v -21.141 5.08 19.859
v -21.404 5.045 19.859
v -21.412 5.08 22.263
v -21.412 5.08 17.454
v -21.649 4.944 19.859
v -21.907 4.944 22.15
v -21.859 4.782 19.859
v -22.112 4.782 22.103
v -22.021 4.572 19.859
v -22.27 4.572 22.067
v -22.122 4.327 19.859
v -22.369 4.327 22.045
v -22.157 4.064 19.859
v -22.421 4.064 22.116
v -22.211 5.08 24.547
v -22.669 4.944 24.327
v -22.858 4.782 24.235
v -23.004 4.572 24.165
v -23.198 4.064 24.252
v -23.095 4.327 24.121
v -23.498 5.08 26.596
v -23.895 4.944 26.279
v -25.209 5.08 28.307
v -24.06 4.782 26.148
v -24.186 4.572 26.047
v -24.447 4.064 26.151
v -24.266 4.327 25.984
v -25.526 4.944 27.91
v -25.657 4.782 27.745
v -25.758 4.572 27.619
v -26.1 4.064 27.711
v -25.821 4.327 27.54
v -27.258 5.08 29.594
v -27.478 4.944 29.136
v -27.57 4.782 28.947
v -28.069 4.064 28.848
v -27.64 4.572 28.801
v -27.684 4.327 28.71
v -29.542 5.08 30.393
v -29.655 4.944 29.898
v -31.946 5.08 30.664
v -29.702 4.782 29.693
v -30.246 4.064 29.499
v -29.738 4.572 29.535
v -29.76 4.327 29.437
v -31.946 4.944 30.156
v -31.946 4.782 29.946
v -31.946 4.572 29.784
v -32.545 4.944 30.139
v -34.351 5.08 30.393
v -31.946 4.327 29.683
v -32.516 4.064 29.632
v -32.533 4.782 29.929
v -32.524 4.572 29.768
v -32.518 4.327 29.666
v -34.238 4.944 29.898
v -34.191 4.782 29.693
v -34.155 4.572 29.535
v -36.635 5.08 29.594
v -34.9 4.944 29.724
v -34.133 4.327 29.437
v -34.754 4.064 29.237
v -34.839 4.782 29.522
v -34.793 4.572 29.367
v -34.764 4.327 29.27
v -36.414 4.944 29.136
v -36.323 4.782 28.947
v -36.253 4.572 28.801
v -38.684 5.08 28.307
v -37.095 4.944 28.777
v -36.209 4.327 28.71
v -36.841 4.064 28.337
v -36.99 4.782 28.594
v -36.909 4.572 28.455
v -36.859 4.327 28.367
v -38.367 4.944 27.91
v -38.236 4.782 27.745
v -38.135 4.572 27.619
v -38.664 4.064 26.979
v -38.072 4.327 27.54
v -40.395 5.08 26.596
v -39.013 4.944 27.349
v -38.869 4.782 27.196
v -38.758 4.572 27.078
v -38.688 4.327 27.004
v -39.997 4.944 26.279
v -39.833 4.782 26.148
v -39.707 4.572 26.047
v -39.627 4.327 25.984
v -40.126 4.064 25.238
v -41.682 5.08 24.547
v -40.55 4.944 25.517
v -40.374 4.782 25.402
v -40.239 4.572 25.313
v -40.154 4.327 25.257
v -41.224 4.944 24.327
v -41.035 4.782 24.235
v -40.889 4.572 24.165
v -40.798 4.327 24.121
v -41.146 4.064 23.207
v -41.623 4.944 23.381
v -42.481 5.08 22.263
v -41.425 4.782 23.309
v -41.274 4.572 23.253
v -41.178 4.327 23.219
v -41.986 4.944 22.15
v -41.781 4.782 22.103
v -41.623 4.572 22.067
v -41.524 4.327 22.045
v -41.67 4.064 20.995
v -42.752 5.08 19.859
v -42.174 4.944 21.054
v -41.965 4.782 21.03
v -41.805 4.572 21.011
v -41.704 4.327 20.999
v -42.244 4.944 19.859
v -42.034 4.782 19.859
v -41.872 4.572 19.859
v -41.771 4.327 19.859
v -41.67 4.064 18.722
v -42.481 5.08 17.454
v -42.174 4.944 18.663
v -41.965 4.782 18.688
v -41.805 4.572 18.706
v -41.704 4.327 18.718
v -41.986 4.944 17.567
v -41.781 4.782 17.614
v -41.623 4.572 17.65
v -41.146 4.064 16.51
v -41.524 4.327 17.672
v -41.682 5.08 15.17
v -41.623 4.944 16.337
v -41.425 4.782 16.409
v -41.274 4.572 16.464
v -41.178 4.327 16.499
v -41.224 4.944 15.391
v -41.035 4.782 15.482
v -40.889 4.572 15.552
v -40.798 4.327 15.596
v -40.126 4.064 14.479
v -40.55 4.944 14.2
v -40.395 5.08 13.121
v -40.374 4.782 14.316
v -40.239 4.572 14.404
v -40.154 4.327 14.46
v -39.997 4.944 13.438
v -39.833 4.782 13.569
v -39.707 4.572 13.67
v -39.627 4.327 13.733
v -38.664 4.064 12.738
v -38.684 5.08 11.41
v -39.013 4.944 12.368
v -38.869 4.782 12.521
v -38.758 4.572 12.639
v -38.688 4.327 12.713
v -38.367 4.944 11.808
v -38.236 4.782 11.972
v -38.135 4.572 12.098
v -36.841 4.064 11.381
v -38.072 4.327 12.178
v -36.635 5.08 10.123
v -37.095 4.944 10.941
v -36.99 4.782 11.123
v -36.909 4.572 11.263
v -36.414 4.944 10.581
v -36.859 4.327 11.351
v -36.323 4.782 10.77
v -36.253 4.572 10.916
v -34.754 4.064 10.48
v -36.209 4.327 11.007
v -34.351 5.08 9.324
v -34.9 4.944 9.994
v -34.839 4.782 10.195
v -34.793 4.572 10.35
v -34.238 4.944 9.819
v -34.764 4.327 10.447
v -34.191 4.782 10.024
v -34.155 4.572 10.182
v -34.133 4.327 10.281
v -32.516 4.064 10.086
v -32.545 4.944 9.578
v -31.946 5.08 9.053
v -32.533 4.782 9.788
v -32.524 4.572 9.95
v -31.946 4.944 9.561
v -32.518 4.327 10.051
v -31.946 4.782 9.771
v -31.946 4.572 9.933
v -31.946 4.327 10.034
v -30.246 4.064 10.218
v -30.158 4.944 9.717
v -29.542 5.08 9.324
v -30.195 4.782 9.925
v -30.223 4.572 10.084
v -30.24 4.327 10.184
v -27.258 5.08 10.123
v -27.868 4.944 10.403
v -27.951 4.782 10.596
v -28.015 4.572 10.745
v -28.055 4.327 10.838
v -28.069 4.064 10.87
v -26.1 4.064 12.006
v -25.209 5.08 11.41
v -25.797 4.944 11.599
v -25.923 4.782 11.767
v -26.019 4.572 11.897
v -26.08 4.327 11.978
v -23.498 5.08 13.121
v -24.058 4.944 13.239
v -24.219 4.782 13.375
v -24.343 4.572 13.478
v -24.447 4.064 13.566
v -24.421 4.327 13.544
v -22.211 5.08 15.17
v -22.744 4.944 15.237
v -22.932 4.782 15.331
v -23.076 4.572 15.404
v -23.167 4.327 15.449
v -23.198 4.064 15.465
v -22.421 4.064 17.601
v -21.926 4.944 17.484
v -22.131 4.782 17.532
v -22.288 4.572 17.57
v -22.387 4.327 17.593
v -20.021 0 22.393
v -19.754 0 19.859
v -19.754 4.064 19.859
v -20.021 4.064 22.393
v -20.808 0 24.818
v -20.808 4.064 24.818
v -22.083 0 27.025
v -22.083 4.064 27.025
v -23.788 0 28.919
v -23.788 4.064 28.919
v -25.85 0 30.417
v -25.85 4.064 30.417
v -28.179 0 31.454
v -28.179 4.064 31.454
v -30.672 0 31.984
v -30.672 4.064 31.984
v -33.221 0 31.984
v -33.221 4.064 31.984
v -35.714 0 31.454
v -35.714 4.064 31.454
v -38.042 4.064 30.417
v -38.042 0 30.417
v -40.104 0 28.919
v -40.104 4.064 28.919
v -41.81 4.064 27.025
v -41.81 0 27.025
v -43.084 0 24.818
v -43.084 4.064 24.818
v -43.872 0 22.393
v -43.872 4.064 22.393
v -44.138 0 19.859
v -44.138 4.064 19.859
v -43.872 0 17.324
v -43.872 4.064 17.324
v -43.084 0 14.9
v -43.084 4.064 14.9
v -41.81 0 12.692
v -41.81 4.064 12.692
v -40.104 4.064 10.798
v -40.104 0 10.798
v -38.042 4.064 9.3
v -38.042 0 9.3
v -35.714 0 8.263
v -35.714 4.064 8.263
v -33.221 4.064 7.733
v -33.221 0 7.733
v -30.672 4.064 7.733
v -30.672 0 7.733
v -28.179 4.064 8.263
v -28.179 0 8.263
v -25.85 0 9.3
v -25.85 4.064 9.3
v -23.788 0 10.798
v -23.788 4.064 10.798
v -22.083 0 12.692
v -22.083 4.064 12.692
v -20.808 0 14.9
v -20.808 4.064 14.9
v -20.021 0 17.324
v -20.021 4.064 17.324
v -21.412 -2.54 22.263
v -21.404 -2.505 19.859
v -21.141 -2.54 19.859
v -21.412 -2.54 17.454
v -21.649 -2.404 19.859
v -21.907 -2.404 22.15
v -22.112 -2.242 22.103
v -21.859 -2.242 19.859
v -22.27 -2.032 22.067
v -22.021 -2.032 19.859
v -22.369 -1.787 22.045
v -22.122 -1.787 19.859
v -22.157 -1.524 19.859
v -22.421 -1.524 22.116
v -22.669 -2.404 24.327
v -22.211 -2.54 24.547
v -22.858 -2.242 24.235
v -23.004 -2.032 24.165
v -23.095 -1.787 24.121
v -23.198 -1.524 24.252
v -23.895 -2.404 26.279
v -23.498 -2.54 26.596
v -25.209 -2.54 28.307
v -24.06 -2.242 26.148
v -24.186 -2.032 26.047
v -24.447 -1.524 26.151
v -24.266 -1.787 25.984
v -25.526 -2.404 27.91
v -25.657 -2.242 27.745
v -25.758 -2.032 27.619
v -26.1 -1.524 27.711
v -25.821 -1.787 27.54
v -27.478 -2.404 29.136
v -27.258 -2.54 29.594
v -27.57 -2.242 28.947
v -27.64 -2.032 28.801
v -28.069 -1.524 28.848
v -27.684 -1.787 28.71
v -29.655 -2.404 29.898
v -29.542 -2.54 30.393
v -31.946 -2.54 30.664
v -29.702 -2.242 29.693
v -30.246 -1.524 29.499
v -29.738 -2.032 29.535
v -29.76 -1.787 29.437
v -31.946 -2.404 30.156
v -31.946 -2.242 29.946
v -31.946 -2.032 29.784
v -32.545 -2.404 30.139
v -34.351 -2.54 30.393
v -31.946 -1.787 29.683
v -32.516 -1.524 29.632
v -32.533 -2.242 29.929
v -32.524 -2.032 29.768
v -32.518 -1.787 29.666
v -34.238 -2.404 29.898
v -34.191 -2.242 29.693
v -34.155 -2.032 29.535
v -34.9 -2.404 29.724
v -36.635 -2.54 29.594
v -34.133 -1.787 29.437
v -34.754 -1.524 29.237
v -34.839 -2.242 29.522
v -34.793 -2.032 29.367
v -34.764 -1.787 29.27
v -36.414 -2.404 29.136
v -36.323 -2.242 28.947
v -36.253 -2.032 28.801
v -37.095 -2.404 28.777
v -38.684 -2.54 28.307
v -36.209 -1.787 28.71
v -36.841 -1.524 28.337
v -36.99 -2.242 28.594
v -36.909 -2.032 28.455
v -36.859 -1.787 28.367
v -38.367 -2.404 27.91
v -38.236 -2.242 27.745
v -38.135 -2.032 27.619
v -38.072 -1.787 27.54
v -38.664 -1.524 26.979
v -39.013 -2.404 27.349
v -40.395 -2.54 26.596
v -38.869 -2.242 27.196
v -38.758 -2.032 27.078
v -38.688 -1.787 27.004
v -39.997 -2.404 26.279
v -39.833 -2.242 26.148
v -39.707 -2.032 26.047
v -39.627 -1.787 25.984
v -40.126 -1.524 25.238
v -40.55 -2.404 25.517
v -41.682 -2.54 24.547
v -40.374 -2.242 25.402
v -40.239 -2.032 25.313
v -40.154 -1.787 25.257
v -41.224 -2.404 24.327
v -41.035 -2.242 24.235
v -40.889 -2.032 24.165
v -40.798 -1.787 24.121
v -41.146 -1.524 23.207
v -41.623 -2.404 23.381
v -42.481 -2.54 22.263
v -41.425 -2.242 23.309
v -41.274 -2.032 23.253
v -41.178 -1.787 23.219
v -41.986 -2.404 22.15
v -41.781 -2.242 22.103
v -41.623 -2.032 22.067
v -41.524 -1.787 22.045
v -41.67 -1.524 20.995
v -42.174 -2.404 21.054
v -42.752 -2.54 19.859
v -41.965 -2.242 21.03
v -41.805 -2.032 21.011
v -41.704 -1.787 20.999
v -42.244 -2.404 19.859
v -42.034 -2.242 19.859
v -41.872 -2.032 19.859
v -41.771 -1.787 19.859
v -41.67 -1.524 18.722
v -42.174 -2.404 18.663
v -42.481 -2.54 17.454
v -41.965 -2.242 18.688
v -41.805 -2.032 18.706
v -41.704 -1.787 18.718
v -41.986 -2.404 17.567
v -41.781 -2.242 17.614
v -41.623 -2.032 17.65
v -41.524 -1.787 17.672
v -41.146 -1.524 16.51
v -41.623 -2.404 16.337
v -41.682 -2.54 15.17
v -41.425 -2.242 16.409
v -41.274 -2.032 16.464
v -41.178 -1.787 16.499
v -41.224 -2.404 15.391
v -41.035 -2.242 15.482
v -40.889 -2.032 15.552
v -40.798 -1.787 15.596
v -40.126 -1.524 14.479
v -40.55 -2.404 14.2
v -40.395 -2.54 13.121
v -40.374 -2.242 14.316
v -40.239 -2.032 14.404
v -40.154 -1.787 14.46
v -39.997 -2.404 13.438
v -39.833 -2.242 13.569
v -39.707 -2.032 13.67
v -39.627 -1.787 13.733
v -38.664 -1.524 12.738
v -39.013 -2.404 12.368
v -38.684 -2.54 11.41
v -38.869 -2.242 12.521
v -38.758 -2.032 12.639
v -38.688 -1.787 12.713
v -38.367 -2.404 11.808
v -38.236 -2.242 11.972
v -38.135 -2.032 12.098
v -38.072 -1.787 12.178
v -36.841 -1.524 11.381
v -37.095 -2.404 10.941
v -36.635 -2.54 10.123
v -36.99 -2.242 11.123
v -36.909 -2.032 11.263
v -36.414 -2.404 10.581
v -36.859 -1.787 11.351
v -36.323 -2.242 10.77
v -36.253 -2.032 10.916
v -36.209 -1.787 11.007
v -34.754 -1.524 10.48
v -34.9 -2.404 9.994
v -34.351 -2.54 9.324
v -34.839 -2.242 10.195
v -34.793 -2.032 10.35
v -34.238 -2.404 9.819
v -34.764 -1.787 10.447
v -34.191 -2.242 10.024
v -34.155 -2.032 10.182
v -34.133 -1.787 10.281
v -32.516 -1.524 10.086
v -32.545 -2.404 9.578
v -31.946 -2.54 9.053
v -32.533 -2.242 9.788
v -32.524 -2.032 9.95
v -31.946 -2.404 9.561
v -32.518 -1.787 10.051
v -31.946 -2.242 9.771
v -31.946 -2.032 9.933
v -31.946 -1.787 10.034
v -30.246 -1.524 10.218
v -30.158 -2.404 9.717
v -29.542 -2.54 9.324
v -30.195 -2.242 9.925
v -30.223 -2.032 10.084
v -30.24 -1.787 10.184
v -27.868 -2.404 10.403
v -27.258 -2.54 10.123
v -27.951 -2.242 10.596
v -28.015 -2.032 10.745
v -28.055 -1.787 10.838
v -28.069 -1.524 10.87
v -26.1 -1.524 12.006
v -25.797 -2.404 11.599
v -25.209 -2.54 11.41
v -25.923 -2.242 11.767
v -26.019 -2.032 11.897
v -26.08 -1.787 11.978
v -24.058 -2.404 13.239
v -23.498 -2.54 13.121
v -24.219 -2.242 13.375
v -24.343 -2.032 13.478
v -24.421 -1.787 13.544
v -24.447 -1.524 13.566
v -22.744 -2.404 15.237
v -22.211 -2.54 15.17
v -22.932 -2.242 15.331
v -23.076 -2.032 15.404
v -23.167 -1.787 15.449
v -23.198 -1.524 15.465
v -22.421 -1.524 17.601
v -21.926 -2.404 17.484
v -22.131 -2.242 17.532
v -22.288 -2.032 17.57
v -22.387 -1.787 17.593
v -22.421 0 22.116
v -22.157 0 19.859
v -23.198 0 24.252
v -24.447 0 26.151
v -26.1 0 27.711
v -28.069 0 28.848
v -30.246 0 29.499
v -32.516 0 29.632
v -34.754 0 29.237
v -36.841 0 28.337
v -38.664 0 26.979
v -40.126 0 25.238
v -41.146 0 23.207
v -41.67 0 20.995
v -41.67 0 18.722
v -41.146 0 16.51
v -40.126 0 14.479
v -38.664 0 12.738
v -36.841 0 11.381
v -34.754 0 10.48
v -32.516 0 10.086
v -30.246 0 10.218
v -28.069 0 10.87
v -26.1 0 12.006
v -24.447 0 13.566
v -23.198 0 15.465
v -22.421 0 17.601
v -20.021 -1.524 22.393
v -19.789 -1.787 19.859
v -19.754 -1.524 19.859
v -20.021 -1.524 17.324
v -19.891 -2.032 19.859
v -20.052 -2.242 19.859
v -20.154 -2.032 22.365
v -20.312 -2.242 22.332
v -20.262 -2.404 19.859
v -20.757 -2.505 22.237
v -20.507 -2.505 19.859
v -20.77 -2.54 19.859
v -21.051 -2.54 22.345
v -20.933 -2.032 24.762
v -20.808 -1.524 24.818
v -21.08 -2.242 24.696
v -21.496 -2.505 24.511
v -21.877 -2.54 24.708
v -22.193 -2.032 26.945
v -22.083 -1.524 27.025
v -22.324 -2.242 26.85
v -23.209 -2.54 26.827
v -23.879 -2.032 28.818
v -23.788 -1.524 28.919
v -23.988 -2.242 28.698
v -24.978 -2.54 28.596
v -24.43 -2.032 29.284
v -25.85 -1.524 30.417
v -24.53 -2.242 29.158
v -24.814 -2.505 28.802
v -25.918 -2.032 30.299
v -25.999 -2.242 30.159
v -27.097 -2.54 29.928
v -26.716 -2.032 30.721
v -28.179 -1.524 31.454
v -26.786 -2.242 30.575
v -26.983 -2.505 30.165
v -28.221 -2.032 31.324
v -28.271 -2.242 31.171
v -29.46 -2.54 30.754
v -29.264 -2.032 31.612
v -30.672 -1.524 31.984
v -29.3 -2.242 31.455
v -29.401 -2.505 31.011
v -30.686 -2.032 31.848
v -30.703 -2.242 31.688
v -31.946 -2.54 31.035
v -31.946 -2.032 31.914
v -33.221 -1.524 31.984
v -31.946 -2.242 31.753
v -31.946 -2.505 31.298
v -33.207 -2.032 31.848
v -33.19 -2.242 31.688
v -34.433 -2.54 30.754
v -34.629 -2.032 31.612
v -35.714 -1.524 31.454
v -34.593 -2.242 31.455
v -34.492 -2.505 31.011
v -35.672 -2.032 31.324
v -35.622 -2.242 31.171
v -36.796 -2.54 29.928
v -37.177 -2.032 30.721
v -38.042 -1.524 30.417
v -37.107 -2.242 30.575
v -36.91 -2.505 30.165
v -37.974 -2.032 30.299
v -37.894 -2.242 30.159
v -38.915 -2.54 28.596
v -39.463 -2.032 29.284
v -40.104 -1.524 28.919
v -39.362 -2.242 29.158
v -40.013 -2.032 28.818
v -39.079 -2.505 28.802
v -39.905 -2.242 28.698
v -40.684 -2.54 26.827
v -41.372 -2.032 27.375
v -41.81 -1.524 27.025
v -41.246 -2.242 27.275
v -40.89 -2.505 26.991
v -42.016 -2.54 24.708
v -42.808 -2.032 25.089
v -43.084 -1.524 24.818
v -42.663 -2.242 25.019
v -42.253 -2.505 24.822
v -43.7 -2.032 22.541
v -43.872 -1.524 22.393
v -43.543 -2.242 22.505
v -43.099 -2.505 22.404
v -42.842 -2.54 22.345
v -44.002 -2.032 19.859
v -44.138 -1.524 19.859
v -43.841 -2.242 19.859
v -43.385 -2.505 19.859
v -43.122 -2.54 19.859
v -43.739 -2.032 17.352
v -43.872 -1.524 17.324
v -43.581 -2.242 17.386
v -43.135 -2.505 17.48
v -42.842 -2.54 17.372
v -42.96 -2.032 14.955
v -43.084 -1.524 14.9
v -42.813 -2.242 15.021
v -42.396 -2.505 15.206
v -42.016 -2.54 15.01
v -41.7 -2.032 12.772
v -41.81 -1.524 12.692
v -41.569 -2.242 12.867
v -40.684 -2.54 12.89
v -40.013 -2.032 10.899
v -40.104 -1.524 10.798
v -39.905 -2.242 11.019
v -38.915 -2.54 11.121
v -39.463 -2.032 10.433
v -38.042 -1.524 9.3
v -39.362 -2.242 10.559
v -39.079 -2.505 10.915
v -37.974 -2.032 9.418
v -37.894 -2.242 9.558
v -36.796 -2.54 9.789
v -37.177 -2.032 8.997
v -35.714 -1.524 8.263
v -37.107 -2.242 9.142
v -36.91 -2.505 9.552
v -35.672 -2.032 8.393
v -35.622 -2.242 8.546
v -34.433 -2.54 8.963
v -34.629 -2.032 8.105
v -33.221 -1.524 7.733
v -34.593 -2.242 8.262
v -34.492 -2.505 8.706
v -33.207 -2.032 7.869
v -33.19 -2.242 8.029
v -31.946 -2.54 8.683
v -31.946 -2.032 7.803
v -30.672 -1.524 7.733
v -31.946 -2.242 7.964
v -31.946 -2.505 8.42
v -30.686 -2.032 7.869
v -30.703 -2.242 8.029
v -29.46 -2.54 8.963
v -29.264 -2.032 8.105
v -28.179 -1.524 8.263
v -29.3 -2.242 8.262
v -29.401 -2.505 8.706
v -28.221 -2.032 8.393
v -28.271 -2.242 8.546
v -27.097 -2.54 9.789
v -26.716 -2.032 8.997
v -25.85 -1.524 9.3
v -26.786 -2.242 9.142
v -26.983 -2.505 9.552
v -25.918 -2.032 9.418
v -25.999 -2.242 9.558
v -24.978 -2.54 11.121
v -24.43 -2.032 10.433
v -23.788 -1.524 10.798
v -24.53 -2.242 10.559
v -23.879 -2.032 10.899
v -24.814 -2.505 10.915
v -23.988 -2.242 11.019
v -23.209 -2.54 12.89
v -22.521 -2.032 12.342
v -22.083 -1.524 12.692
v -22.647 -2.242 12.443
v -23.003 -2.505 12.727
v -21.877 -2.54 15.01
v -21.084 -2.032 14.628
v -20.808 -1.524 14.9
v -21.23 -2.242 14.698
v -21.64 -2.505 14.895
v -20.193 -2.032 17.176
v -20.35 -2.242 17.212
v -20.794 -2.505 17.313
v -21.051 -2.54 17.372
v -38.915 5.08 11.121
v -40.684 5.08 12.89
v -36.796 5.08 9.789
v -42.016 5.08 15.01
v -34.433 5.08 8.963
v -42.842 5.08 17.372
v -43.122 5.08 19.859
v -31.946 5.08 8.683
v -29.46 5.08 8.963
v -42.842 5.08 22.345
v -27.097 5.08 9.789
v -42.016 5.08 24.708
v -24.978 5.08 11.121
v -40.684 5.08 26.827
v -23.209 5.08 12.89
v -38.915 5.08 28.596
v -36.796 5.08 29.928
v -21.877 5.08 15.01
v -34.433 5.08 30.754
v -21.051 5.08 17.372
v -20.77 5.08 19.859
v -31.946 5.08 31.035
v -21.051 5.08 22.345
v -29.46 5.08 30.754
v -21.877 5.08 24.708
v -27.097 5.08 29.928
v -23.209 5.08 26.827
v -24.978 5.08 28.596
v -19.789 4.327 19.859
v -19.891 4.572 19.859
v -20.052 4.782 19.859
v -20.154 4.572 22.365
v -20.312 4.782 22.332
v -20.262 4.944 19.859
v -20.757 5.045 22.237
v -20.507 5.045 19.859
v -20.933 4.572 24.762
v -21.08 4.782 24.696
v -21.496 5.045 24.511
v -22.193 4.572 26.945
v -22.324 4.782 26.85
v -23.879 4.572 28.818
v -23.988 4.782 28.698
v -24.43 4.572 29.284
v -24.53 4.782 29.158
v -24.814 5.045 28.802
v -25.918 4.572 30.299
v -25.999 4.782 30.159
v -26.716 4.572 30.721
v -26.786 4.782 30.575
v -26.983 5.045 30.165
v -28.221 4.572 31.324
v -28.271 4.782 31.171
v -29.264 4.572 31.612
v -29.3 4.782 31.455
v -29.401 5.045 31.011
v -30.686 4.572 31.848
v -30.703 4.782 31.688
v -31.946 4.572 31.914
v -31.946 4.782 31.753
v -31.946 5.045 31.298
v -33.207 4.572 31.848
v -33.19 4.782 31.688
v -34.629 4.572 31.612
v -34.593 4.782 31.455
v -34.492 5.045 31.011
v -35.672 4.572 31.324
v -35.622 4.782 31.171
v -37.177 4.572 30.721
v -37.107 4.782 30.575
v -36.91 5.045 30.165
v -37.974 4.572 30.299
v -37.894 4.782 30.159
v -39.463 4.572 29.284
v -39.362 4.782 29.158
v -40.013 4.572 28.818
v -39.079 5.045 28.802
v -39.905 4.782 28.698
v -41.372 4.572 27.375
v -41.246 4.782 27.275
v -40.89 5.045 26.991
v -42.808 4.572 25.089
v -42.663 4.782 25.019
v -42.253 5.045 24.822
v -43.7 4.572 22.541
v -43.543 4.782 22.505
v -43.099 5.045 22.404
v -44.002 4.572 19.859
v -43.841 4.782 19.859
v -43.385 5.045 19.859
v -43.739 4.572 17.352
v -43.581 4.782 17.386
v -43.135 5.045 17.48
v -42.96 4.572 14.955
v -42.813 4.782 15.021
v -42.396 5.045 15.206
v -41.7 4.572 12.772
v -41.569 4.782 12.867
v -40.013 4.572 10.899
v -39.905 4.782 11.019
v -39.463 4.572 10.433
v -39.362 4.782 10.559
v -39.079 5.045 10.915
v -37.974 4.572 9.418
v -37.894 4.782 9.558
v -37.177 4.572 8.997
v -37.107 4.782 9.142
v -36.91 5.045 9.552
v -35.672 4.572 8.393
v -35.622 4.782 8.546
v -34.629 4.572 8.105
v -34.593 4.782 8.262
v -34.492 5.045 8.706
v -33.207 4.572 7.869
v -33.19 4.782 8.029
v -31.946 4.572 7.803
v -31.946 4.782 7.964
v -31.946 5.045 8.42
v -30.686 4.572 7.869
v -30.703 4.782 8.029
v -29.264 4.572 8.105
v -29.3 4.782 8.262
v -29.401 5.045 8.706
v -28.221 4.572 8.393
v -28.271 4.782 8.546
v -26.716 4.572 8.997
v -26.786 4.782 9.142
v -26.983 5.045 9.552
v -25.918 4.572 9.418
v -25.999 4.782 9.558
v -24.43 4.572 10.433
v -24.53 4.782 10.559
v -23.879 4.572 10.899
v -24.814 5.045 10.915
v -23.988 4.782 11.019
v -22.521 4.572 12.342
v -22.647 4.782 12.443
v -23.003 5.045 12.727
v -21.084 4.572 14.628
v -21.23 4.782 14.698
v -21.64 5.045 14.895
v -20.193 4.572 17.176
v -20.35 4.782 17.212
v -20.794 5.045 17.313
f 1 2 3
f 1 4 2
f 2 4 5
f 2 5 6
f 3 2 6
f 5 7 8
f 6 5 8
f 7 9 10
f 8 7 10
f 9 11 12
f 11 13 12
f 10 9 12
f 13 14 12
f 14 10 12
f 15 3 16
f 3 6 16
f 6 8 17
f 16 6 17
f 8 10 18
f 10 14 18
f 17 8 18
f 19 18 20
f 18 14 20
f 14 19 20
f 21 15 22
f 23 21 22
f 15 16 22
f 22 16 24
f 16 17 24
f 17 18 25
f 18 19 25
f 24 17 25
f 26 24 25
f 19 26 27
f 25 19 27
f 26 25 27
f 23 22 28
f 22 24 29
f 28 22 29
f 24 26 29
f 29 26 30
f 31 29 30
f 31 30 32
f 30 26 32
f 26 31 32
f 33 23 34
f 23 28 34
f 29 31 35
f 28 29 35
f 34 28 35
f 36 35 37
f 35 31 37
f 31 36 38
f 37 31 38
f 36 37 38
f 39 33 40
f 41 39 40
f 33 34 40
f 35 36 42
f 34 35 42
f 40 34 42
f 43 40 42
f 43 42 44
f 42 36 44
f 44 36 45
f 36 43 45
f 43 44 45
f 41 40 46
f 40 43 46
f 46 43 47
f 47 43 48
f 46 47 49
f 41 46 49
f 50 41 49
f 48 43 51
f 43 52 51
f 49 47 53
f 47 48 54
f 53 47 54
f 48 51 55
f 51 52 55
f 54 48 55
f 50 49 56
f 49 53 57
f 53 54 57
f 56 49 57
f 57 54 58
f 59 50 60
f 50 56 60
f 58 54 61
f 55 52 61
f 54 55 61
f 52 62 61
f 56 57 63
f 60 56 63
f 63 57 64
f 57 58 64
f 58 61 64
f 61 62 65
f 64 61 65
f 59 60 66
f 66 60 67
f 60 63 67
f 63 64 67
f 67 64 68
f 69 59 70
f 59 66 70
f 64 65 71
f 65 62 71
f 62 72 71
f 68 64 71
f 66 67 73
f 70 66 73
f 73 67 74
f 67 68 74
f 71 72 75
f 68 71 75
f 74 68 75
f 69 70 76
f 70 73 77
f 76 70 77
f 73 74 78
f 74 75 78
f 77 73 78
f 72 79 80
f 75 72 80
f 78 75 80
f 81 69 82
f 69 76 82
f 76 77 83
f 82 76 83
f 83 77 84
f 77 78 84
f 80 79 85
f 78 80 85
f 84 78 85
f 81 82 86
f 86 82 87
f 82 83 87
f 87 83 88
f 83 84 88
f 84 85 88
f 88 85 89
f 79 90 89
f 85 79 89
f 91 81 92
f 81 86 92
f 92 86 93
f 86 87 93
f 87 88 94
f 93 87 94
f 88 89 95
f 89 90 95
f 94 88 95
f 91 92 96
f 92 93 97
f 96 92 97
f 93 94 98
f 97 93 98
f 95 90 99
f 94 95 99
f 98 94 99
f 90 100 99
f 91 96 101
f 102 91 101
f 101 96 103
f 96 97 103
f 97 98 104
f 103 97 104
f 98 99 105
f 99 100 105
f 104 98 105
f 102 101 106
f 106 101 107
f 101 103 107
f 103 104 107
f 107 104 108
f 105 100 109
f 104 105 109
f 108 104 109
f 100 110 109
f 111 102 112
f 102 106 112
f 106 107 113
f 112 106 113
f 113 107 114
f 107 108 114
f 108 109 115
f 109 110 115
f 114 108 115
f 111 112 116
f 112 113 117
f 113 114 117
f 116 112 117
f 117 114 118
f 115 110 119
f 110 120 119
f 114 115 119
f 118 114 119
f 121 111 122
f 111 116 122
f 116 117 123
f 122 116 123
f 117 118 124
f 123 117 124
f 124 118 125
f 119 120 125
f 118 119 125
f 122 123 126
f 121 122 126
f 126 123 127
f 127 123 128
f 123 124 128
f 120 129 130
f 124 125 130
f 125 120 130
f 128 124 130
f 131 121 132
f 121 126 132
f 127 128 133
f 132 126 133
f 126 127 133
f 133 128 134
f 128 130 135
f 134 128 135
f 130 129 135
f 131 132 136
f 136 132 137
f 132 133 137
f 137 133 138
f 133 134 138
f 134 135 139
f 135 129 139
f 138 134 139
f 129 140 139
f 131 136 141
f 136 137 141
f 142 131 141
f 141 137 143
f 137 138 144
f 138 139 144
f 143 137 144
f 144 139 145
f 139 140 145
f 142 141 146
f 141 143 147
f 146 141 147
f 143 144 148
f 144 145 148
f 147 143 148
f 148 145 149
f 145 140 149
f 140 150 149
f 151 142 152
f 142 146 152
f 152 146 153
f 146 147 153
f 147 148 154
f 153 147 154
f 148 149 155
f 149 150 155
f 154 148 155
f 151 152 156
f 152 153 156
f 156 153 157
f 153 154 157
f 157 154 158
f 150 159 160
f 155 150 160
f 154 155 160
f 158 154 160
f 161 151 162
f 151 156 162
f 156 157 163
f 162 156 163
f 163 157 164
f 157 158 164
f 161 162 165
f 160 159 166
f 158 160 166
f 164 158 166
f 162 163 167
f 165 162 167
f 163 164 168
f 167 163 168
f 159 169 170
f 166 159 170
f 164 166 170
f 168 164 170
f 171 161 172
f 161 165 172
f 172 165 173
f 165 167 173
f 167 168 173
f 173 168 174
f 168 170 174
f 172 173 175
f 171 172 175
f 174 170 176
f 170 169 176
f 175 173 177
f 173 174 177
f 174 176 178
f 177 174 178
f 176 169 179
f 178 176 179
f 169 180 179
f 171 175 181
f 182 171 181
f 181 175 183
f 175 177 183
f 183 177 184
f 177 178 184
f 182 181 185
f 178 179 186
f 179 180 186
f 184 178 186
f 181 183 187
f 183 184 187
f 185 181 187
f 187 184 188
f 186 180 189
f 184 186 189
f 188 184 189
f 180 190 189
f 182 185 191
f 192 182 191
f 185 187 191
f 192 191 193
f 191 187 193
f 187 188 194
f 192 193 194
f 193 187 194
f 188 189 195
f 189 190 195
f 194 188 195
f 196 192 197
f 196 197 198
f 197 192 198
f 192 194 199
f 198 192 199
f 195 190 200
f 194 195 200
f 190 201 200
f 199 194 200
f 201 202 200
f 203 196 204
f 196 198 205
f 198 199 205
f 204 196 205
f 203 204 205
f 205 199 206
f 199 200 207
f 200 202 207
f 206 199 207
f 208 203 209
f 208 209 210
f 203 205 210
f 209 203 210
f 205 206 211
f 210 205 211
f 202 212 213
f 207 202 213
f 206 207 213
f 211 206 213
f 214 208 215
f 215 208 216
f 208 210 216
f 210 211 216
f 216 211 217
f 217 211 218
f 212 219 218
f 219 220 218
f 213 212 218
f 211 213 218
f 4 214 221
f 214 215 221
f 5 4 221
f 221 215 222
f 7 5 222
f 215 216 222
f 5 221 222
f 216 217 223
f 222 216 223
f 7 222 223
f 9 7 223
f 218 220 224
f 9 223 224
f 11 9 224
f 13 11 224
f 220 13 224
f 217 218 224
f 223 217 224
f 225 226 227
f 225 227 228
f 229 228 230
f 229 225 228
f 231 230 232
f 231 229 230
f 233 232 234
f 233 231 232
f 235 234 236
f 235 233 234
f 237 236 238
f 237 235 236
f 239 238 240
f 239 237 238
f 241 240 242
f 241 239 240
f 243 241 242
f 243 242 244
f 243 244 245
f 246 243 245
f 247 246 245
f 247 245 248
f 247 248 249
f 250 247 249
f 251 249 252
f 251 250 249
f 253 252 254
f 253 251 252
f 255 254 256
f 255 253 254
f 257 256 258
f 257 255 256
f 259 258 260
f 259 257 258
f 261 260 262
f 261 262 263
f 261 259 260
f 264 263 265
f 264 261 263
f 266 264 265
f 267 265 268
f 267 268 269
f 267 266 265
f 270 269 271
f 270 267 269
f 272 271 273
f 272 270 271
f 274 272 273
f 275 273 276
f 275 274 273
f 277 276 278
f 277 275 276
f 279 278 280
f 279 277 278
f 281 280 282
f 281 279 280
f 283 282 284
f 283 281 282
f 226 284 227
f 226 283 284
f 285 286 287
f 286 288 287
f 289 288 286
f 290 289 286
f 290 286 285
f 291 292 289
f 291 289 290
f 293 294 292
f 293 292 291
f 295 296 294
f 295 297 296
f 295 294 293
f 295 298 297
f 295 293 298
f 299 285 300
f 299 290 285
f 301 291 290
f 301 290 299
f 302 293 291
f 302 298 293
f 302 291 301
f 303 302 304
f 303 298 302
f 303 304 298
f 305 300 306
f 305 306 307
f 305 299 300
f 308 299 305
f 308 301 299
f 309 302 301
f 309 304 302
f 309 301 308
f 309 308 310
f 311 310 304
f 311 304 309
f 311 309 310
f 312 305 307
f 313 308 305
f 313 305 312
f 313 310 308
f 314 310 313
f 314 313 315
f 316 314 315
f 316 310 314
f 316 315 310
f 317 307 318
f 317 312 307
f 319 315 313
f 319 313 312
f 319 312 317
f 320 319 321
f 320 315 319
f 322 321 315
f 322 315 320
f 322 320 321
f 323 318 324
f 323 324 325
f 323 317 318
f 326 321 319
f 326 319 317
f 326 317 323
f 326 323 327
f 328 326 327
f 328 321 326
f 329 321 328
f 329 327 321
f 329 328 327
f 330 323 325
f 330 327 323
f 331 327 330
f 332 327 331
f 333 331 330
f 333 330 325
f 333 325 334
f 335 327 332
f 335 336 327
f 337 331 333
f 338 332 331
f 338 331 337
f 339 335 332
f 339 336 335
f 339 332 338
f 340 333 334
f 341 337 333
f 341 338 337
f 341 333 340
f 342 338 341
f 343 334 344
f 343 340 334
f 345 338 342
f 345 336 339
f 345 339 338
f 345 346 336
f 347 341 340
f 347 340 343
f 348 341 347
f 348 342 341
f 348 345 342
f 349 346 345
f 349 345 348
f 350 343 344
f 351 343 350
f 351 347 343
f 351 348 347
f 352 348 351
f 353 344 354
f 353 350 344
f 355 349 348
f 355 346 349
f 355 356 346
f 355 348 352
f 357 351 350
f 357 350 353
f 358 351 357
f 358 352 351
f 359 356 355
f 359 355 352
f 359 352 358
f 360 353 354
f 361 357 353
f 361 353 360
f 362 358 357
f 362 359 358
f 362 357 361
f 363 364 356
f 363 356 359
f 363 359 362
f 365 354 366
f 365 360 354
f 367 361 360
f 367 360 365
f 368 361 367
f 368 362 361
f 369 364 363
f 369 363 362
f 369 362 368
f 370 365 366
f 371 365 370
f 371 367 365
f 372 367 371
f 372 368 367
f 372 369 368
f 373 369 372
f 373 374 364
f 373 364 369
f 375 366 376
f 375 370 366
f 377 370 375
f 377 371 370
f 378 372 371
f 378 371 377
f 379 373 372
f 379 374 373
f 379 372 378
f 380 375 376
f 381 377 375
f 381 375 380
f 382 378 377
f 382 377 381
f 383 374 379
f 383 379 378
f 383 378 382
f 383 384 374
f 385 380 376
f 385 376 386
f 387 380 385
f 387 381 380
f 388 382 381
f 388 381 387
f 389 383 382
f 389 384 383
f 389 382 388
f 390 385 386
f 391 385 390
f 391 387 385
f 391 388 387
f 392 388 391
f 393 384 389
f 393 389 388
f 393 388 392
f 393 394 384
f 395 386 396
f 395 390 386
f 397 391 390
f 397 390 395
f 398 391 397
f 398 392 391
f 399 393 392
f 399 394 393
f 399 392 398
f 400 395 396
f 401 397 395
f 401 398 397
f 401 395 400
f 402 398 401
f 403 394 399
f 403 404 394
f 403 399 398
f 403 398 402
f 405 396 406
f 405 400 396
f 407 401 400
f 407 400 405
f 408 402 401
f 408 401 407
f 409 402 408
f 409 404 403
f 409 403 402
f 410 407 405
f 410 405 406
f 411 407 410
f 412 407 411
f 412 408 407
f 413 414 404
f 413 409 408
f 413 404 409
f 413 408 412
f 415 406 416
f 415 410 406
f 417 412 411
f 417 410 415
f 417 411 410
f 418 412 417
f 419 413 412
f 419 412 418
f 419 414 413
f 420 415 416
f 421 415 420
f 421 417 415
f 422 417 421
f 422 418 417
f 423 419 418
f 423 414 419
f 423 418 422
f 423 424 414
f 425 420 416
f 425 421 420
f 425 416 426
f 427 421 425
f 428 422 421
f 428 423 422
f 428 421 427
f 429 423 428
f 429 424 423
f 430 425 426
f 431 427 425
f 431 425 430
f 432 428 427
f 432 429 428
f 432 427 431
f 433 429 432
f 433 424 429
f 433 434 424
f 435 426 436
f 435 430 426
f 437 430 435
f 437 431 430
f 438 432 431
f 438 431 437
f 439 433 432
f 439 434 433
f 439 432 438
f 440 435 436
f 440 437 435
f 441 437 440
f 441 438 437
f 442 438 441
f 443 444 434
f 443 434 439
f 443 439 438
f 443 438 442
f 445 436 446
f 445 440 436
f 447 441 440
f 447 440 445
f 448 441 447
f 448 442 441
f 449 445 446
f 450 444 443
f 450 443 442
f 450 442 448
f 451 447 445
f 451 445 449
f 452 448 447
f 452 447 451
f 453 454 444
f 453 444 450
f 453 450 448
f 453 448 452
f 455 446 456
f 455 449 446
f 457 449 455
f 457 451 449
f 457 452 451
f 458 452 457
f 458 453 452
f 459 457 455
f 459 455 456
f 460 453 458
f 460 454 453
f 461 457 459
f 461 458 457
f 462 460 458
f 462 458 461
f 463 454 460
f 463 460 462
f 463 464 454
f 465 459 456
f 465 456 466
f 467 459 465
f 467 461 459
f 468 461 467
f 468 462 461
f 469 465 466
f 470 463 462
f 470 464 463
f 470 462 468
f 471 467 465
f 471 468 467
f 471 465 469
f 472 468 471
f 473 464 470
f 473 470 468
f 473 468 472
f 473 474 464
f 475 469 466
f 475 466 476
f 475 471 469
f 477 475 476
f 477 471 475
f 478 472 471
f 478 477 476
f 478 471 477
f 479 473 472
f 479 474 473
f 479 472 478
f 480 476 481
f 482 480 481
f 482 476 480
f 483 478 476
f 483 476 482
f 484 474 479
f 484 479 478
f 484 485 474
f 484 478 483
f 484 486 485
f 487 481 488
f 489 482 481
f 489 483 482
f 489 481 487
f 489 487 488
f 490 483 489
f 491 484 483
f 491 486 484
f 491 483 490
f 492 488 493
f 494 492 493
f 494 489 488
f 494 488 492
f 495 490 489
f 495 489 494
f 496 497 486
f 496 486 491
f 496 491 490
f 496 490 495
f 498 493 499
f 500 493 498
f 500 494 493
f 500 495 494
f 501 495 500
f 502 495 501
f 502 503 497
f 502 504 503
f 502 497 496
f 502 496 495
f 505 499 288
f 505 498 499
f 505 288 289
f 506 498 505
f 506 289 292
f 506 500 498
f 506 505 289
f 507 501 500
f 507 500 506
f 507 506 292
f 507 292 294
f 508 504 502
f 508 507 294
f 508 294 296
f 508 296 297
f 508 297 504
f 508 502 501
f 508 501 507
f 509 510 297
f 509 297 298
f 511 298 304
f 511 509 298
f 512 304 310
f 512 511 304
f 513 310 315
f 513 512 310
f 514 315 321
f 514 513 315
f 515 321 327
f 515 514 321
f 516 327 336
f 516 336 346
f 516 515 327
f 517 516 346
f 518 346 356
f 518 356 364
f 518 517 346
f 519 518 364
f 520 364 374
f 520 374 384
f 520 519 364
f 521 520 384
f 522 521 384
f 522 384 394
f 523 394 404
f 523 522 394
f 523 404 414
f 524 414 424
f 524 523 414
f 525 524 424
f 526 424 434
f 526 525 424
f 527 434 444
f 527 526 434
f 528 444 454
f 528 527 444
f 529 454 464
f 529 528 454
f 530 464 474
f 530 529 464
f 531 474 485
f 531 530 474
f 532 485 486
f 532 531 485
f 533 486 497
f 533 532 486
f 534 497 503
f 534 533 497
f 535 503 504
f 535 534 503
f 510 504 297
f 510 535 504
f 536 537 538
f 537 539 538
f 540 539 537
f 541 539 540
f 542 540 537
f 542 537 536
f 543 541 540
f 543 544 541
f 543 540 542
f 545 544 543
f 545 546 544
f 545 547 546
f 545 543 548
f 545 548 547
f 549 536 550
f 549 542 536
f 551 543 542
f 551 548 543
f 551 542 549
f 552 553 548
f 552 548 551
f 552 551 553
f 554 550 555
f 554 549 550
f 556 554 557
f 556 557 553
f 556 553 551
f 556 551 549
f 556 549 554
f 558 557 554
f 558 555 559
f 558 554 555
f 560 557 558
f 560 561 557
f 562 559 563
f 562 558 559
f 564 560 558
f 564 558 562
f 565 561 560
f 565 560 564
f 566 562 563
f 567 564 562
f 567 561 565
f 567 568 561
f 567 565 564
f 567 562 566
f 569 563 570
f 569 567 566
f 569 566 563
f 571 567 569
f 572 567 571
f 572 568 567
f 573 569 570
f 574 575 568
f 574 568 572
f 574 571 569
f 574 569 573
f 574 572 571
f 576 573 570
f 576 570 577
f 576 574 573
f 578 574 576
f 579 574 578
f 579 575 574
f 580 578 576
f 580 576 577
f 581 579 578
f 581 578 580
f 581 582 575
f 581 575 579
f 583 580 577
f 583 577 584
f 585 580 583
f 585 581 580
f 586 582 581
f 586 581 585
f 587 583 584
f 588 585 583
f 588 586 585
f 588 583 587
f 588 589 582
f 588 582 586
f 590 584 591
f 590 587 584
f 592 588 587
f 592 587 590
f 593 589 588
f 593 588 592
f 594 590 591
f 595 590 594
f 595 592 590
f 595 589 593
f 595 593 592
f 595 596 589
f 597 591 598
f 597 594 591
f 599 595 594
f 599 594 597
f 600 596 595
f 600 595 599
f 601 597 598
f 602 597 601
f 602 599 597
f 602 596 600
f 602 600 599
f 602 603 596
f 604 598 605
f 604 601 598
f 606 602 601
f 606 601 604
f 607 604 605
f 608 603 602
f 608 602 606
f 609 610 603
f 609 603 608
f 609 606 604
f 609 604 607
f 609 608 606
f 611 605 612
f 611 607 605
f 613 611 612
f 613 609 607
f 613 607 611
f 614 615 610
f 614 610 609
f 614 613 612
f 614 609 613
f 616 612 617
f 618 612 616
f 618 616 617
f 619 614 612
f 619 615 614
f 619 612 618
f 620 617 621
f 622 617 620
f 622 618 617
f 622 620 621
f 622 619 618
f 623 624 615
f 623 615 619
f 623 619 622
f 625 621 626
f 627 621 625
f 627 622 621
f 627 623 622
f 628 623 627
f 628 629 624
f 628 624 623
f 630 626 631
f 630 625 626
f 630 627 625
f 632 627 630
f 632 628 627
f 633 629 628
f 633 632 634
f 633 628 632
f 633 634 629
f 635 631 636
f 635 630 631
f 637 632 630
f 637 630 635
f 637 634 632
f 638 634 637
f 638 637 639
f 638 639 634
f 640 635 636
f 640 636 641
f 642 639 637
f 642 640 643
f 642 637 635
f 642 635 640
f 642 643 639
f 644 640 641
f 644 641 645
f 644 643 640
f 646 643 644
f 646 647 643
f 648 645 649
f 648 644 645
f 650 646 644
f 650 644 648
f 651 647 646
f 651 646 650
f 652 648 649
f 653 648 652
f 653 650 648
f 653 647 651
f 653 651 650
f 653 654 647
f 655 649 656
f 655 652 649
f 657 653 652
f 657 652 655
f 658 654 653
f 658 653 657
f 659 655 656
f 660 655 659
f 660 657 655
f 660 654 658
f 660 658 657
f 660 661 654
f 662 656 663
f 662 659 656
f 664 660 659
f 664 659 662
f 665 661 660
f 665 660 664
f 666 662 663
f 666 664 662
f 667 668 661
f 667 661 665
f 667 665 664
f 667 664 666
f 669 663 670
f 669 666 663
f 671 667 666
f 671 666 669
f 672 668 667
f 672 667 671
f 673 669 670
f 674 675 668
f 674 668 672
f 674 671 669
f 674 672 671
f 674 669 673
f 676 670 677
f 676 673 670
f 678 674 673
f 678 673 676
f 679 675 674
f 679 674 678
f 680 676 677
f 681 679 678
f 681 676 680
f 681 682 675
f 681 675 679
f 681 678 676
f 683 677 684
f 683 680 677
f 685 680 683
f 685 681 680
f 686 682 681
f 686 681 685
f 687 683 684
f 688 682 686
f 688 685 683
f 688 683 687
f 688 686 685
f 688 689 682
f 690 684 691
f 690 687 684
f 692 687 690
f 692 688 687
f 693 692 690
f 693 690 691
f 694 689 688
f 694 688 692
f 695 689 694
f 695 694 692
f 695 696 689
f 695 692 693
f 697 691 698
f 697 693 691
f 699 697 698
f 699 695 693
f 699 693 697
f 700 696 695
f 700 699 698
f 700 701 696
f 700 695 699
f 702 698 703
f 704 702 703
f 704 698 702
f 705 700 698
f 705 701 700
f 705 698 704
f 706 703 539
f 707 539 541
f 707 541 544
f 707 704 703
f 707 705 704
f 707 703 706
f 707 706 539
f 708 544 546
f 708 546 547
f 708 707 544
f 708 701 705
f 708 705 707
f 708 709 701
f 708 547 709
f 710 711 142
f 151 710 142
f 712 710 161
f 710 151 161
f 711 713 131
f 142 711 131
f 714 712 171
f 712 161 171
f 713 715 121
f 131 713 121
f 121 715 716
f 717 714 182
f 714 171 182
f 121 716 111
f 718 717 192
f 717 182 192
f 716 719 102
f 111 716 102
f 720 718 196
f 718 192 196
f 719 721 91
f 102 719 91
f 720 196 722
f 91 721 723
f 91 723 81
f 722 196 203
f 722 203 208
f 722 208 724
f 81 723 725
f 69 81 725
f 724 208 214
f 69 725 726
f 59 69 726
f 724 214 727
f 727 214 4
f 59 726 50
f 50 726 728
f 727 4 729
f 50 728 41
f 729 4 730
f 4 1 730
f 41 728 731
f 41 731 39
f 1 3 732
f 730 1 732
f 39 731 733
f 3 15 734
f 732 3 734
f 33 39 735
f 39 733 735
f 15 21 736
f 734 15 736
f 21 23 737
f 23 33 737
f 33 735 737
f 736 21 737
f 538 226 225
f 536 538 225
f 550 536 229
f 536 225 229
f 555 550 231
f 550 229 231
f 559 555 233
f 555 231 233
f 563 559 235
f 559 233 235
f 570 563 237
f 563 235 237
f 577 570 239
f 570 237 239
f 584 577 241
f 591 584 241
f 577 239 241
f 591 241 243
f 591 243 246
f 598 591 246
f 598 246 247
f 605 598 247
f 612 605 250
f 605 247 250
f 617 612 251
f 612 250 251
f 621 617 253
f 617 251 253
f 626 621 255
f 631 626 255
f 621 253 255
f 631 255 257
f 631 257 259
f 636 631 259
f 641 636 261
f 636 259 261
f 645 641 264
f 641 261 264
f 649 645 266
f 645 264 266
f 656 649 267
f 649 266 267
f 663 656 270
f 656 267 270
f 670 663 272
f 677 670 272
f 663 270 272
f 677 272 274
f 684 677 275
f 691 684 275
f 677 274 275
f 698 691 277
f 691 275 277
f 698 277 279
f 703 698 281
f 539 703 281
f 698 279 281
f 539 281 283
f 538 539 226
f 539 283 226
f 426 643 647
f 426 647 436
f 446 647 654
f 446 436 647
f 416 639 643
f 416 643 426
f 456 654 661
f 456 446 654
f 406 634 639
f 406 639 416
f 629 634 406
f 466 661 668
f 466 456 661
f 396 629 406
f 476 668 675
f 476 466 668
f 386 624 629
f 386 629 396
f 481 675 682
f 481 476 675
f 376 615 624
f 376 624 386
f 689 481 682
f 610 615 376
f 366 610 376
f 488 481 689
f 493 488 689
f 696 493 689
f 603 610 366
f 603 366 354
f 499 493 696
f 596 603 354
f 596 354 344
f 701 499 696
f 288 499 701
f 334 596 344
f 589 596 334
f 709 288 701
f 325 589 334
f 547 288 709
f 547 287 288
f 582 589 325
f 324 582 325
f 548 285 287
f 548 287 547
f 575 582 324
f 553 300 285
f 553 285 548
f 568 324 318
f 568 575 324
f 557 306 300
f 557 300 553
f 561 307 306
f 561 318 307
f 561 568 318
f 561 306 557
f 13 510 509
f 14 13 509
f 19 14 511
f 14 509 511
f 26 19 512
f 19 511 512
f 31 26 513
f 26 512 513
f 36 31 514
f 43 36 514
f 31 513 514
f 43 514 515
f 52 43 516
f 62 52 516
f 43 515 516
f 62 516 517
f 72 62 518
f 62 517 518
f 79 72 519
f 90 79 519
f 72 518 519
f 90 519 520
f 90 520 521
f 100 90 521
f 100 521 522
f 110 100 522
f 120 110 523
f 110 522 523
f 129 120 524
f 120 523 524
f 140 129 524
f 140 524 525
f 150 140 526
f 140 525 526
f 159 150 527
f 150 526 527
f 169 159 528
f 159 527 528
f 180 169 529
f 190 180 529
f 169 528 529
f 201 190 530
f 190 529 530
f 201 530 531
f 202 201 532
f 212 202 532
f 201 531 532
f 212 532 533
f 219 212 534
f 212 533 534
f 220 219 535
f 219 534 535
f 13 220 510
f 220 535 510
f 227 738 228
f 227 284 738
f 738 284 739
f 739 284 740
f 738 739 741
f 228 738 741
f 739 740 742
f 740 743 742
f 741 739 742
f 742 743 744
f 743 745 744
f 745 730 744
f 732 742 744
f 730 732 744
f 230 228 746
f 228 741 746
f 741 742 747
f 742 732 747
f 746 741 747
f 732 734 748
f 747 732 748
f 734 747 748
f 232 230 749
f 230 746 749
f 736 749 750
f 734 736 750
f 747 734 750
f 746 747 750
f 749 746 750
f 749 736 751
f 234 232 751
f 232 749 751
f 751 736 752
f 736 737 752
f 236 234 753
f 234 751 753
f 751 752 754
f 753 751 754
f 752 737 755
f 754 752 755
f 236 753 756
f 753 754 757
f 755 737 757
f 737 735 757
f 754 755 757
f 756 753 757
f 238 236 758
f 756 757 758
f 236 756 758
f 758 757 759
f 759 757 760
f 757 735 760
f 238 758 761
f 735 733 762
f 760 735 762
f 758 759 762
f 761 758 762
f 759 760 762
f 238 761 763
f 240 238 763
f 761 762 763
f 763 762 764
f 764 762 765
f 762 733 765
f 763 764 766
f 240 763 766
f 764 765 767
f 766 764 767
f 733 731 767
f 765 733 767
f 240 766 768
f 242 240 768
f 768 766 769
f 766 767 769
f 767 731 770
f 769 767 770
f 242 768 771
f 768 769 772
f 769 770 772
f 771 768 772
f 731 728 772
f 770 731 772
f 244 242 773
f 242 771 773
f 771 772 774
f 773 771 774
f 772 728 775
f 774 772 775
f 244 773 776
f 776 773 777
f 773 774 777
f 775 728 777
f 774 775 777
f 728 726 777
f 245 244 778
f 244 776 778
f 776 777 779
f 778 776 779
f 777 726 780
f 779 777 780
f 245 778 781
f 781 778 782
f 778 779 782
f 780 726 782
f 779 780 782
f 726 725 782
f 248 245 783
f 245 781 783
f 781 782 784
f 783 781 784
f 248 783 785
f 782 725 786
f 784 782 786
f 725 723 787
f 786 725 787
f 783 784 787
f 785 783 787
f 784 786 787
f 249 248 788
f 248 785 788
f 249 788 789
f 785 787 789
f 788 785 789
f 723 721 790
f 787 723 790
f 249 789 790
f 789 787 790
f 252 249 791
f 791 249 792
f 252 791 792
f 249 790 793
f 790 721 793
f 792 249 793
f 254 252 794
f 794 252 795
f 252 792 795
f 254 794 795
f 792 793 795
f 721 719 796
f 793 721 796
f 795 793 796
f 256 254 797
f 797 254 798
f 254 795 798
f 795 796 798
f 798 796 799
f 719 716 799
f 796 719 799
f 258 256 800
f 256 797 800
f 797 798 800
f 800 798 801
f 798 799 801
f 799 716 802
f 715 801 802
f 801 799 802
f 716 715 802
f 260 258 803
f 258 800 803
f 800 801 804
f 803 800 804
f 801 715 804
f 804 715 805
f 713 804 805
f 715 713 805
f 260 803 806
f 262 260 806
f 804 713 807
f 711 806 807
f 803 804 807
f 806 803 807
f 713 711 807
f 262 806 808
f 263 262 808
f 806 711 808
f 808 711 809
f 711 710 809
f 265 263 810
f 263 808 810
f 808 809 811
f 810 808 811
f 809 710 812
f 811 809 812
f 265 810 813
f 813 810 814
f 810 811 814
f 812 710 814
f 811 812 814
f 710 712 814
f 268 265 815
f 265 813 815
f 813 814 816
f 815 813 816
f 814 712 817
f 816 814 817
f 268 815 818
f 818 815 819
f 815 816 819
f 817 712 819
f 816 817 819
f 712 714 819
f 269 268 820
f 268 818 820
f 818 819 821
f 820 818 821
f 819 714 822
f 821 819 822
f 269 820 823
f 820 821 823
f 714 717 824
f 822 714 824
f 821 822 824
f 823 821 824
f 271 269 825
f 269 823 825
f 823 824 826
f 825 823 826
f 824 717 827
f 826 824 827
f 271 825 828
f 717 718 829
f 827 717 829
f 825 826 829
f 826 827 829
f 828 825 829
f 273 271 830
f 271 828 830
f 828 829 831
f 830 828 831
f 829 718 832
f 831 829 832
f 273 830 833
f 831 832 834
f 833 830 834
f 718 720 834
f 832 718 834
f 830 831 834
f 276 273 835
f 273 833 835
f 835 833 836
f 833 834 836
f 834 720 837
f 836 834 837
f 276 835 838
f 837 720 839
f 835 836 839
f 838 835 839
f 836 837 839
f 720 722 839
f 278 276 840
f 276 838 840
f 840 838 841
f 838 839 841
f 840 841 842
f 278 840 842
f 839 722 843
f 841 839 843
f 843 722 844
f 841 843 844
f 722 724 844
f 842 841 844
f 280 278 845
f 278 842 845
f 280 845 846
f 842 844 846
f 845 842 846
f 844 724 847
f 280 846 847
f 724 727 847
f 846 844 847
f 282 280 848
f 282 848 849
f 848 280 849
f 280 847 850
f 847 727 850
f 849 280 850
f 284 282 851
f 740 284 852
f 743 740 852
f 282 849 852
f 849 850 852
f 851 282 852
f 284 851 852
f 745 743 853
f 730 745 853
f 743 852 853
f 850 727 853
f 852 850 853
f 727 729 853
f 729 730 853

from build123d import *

# Parameters (mm, degrees)
F0_R     = 12.192
F0_R_2   = 9.789627
F1_DEPTH = 5.08
F2_DEPTH = 2.54
F3_R     = 1.016


with BuildPart() as f1:
    # F0 (on Front) → F1 (new body)
    with BuildSketch(Plane.XZ):
        with Locations((-31.946439, 19.858599)):
            Circle(F0_R)
        with Locations((-31.946439, 19.858599)):
            Circle(F0_R_2, mode=Mode.SUBTRACT)
    extrude(amount=-F1_DEPTH)

    # F0 (on Front) → F2 (join)
    with BuildSketch(Plane.XZ):
        with Locations((-31.946439, 19.858599)):
            Circle(F0_R)
        with Locations((-31.946439, 19.858599)):
            Circle(F0_R_2, mode=Mode.SUBTRACT)
    extrude(amount=F2_DEPTH)

    # F3
    f3_edges = [f1.edges().sort_by_distance(p)[0] for p in [
        (-44.138439, -2.54, 19.858599),
        (-41.736067, -2.54, 19.858599),
        (-41.736067, 5.08, 19.858599),
        (-44.138439, 5.08, 19.858599),
    ]]
    fillet(f3_edges, radius=F3_R)


solid = f1.part
